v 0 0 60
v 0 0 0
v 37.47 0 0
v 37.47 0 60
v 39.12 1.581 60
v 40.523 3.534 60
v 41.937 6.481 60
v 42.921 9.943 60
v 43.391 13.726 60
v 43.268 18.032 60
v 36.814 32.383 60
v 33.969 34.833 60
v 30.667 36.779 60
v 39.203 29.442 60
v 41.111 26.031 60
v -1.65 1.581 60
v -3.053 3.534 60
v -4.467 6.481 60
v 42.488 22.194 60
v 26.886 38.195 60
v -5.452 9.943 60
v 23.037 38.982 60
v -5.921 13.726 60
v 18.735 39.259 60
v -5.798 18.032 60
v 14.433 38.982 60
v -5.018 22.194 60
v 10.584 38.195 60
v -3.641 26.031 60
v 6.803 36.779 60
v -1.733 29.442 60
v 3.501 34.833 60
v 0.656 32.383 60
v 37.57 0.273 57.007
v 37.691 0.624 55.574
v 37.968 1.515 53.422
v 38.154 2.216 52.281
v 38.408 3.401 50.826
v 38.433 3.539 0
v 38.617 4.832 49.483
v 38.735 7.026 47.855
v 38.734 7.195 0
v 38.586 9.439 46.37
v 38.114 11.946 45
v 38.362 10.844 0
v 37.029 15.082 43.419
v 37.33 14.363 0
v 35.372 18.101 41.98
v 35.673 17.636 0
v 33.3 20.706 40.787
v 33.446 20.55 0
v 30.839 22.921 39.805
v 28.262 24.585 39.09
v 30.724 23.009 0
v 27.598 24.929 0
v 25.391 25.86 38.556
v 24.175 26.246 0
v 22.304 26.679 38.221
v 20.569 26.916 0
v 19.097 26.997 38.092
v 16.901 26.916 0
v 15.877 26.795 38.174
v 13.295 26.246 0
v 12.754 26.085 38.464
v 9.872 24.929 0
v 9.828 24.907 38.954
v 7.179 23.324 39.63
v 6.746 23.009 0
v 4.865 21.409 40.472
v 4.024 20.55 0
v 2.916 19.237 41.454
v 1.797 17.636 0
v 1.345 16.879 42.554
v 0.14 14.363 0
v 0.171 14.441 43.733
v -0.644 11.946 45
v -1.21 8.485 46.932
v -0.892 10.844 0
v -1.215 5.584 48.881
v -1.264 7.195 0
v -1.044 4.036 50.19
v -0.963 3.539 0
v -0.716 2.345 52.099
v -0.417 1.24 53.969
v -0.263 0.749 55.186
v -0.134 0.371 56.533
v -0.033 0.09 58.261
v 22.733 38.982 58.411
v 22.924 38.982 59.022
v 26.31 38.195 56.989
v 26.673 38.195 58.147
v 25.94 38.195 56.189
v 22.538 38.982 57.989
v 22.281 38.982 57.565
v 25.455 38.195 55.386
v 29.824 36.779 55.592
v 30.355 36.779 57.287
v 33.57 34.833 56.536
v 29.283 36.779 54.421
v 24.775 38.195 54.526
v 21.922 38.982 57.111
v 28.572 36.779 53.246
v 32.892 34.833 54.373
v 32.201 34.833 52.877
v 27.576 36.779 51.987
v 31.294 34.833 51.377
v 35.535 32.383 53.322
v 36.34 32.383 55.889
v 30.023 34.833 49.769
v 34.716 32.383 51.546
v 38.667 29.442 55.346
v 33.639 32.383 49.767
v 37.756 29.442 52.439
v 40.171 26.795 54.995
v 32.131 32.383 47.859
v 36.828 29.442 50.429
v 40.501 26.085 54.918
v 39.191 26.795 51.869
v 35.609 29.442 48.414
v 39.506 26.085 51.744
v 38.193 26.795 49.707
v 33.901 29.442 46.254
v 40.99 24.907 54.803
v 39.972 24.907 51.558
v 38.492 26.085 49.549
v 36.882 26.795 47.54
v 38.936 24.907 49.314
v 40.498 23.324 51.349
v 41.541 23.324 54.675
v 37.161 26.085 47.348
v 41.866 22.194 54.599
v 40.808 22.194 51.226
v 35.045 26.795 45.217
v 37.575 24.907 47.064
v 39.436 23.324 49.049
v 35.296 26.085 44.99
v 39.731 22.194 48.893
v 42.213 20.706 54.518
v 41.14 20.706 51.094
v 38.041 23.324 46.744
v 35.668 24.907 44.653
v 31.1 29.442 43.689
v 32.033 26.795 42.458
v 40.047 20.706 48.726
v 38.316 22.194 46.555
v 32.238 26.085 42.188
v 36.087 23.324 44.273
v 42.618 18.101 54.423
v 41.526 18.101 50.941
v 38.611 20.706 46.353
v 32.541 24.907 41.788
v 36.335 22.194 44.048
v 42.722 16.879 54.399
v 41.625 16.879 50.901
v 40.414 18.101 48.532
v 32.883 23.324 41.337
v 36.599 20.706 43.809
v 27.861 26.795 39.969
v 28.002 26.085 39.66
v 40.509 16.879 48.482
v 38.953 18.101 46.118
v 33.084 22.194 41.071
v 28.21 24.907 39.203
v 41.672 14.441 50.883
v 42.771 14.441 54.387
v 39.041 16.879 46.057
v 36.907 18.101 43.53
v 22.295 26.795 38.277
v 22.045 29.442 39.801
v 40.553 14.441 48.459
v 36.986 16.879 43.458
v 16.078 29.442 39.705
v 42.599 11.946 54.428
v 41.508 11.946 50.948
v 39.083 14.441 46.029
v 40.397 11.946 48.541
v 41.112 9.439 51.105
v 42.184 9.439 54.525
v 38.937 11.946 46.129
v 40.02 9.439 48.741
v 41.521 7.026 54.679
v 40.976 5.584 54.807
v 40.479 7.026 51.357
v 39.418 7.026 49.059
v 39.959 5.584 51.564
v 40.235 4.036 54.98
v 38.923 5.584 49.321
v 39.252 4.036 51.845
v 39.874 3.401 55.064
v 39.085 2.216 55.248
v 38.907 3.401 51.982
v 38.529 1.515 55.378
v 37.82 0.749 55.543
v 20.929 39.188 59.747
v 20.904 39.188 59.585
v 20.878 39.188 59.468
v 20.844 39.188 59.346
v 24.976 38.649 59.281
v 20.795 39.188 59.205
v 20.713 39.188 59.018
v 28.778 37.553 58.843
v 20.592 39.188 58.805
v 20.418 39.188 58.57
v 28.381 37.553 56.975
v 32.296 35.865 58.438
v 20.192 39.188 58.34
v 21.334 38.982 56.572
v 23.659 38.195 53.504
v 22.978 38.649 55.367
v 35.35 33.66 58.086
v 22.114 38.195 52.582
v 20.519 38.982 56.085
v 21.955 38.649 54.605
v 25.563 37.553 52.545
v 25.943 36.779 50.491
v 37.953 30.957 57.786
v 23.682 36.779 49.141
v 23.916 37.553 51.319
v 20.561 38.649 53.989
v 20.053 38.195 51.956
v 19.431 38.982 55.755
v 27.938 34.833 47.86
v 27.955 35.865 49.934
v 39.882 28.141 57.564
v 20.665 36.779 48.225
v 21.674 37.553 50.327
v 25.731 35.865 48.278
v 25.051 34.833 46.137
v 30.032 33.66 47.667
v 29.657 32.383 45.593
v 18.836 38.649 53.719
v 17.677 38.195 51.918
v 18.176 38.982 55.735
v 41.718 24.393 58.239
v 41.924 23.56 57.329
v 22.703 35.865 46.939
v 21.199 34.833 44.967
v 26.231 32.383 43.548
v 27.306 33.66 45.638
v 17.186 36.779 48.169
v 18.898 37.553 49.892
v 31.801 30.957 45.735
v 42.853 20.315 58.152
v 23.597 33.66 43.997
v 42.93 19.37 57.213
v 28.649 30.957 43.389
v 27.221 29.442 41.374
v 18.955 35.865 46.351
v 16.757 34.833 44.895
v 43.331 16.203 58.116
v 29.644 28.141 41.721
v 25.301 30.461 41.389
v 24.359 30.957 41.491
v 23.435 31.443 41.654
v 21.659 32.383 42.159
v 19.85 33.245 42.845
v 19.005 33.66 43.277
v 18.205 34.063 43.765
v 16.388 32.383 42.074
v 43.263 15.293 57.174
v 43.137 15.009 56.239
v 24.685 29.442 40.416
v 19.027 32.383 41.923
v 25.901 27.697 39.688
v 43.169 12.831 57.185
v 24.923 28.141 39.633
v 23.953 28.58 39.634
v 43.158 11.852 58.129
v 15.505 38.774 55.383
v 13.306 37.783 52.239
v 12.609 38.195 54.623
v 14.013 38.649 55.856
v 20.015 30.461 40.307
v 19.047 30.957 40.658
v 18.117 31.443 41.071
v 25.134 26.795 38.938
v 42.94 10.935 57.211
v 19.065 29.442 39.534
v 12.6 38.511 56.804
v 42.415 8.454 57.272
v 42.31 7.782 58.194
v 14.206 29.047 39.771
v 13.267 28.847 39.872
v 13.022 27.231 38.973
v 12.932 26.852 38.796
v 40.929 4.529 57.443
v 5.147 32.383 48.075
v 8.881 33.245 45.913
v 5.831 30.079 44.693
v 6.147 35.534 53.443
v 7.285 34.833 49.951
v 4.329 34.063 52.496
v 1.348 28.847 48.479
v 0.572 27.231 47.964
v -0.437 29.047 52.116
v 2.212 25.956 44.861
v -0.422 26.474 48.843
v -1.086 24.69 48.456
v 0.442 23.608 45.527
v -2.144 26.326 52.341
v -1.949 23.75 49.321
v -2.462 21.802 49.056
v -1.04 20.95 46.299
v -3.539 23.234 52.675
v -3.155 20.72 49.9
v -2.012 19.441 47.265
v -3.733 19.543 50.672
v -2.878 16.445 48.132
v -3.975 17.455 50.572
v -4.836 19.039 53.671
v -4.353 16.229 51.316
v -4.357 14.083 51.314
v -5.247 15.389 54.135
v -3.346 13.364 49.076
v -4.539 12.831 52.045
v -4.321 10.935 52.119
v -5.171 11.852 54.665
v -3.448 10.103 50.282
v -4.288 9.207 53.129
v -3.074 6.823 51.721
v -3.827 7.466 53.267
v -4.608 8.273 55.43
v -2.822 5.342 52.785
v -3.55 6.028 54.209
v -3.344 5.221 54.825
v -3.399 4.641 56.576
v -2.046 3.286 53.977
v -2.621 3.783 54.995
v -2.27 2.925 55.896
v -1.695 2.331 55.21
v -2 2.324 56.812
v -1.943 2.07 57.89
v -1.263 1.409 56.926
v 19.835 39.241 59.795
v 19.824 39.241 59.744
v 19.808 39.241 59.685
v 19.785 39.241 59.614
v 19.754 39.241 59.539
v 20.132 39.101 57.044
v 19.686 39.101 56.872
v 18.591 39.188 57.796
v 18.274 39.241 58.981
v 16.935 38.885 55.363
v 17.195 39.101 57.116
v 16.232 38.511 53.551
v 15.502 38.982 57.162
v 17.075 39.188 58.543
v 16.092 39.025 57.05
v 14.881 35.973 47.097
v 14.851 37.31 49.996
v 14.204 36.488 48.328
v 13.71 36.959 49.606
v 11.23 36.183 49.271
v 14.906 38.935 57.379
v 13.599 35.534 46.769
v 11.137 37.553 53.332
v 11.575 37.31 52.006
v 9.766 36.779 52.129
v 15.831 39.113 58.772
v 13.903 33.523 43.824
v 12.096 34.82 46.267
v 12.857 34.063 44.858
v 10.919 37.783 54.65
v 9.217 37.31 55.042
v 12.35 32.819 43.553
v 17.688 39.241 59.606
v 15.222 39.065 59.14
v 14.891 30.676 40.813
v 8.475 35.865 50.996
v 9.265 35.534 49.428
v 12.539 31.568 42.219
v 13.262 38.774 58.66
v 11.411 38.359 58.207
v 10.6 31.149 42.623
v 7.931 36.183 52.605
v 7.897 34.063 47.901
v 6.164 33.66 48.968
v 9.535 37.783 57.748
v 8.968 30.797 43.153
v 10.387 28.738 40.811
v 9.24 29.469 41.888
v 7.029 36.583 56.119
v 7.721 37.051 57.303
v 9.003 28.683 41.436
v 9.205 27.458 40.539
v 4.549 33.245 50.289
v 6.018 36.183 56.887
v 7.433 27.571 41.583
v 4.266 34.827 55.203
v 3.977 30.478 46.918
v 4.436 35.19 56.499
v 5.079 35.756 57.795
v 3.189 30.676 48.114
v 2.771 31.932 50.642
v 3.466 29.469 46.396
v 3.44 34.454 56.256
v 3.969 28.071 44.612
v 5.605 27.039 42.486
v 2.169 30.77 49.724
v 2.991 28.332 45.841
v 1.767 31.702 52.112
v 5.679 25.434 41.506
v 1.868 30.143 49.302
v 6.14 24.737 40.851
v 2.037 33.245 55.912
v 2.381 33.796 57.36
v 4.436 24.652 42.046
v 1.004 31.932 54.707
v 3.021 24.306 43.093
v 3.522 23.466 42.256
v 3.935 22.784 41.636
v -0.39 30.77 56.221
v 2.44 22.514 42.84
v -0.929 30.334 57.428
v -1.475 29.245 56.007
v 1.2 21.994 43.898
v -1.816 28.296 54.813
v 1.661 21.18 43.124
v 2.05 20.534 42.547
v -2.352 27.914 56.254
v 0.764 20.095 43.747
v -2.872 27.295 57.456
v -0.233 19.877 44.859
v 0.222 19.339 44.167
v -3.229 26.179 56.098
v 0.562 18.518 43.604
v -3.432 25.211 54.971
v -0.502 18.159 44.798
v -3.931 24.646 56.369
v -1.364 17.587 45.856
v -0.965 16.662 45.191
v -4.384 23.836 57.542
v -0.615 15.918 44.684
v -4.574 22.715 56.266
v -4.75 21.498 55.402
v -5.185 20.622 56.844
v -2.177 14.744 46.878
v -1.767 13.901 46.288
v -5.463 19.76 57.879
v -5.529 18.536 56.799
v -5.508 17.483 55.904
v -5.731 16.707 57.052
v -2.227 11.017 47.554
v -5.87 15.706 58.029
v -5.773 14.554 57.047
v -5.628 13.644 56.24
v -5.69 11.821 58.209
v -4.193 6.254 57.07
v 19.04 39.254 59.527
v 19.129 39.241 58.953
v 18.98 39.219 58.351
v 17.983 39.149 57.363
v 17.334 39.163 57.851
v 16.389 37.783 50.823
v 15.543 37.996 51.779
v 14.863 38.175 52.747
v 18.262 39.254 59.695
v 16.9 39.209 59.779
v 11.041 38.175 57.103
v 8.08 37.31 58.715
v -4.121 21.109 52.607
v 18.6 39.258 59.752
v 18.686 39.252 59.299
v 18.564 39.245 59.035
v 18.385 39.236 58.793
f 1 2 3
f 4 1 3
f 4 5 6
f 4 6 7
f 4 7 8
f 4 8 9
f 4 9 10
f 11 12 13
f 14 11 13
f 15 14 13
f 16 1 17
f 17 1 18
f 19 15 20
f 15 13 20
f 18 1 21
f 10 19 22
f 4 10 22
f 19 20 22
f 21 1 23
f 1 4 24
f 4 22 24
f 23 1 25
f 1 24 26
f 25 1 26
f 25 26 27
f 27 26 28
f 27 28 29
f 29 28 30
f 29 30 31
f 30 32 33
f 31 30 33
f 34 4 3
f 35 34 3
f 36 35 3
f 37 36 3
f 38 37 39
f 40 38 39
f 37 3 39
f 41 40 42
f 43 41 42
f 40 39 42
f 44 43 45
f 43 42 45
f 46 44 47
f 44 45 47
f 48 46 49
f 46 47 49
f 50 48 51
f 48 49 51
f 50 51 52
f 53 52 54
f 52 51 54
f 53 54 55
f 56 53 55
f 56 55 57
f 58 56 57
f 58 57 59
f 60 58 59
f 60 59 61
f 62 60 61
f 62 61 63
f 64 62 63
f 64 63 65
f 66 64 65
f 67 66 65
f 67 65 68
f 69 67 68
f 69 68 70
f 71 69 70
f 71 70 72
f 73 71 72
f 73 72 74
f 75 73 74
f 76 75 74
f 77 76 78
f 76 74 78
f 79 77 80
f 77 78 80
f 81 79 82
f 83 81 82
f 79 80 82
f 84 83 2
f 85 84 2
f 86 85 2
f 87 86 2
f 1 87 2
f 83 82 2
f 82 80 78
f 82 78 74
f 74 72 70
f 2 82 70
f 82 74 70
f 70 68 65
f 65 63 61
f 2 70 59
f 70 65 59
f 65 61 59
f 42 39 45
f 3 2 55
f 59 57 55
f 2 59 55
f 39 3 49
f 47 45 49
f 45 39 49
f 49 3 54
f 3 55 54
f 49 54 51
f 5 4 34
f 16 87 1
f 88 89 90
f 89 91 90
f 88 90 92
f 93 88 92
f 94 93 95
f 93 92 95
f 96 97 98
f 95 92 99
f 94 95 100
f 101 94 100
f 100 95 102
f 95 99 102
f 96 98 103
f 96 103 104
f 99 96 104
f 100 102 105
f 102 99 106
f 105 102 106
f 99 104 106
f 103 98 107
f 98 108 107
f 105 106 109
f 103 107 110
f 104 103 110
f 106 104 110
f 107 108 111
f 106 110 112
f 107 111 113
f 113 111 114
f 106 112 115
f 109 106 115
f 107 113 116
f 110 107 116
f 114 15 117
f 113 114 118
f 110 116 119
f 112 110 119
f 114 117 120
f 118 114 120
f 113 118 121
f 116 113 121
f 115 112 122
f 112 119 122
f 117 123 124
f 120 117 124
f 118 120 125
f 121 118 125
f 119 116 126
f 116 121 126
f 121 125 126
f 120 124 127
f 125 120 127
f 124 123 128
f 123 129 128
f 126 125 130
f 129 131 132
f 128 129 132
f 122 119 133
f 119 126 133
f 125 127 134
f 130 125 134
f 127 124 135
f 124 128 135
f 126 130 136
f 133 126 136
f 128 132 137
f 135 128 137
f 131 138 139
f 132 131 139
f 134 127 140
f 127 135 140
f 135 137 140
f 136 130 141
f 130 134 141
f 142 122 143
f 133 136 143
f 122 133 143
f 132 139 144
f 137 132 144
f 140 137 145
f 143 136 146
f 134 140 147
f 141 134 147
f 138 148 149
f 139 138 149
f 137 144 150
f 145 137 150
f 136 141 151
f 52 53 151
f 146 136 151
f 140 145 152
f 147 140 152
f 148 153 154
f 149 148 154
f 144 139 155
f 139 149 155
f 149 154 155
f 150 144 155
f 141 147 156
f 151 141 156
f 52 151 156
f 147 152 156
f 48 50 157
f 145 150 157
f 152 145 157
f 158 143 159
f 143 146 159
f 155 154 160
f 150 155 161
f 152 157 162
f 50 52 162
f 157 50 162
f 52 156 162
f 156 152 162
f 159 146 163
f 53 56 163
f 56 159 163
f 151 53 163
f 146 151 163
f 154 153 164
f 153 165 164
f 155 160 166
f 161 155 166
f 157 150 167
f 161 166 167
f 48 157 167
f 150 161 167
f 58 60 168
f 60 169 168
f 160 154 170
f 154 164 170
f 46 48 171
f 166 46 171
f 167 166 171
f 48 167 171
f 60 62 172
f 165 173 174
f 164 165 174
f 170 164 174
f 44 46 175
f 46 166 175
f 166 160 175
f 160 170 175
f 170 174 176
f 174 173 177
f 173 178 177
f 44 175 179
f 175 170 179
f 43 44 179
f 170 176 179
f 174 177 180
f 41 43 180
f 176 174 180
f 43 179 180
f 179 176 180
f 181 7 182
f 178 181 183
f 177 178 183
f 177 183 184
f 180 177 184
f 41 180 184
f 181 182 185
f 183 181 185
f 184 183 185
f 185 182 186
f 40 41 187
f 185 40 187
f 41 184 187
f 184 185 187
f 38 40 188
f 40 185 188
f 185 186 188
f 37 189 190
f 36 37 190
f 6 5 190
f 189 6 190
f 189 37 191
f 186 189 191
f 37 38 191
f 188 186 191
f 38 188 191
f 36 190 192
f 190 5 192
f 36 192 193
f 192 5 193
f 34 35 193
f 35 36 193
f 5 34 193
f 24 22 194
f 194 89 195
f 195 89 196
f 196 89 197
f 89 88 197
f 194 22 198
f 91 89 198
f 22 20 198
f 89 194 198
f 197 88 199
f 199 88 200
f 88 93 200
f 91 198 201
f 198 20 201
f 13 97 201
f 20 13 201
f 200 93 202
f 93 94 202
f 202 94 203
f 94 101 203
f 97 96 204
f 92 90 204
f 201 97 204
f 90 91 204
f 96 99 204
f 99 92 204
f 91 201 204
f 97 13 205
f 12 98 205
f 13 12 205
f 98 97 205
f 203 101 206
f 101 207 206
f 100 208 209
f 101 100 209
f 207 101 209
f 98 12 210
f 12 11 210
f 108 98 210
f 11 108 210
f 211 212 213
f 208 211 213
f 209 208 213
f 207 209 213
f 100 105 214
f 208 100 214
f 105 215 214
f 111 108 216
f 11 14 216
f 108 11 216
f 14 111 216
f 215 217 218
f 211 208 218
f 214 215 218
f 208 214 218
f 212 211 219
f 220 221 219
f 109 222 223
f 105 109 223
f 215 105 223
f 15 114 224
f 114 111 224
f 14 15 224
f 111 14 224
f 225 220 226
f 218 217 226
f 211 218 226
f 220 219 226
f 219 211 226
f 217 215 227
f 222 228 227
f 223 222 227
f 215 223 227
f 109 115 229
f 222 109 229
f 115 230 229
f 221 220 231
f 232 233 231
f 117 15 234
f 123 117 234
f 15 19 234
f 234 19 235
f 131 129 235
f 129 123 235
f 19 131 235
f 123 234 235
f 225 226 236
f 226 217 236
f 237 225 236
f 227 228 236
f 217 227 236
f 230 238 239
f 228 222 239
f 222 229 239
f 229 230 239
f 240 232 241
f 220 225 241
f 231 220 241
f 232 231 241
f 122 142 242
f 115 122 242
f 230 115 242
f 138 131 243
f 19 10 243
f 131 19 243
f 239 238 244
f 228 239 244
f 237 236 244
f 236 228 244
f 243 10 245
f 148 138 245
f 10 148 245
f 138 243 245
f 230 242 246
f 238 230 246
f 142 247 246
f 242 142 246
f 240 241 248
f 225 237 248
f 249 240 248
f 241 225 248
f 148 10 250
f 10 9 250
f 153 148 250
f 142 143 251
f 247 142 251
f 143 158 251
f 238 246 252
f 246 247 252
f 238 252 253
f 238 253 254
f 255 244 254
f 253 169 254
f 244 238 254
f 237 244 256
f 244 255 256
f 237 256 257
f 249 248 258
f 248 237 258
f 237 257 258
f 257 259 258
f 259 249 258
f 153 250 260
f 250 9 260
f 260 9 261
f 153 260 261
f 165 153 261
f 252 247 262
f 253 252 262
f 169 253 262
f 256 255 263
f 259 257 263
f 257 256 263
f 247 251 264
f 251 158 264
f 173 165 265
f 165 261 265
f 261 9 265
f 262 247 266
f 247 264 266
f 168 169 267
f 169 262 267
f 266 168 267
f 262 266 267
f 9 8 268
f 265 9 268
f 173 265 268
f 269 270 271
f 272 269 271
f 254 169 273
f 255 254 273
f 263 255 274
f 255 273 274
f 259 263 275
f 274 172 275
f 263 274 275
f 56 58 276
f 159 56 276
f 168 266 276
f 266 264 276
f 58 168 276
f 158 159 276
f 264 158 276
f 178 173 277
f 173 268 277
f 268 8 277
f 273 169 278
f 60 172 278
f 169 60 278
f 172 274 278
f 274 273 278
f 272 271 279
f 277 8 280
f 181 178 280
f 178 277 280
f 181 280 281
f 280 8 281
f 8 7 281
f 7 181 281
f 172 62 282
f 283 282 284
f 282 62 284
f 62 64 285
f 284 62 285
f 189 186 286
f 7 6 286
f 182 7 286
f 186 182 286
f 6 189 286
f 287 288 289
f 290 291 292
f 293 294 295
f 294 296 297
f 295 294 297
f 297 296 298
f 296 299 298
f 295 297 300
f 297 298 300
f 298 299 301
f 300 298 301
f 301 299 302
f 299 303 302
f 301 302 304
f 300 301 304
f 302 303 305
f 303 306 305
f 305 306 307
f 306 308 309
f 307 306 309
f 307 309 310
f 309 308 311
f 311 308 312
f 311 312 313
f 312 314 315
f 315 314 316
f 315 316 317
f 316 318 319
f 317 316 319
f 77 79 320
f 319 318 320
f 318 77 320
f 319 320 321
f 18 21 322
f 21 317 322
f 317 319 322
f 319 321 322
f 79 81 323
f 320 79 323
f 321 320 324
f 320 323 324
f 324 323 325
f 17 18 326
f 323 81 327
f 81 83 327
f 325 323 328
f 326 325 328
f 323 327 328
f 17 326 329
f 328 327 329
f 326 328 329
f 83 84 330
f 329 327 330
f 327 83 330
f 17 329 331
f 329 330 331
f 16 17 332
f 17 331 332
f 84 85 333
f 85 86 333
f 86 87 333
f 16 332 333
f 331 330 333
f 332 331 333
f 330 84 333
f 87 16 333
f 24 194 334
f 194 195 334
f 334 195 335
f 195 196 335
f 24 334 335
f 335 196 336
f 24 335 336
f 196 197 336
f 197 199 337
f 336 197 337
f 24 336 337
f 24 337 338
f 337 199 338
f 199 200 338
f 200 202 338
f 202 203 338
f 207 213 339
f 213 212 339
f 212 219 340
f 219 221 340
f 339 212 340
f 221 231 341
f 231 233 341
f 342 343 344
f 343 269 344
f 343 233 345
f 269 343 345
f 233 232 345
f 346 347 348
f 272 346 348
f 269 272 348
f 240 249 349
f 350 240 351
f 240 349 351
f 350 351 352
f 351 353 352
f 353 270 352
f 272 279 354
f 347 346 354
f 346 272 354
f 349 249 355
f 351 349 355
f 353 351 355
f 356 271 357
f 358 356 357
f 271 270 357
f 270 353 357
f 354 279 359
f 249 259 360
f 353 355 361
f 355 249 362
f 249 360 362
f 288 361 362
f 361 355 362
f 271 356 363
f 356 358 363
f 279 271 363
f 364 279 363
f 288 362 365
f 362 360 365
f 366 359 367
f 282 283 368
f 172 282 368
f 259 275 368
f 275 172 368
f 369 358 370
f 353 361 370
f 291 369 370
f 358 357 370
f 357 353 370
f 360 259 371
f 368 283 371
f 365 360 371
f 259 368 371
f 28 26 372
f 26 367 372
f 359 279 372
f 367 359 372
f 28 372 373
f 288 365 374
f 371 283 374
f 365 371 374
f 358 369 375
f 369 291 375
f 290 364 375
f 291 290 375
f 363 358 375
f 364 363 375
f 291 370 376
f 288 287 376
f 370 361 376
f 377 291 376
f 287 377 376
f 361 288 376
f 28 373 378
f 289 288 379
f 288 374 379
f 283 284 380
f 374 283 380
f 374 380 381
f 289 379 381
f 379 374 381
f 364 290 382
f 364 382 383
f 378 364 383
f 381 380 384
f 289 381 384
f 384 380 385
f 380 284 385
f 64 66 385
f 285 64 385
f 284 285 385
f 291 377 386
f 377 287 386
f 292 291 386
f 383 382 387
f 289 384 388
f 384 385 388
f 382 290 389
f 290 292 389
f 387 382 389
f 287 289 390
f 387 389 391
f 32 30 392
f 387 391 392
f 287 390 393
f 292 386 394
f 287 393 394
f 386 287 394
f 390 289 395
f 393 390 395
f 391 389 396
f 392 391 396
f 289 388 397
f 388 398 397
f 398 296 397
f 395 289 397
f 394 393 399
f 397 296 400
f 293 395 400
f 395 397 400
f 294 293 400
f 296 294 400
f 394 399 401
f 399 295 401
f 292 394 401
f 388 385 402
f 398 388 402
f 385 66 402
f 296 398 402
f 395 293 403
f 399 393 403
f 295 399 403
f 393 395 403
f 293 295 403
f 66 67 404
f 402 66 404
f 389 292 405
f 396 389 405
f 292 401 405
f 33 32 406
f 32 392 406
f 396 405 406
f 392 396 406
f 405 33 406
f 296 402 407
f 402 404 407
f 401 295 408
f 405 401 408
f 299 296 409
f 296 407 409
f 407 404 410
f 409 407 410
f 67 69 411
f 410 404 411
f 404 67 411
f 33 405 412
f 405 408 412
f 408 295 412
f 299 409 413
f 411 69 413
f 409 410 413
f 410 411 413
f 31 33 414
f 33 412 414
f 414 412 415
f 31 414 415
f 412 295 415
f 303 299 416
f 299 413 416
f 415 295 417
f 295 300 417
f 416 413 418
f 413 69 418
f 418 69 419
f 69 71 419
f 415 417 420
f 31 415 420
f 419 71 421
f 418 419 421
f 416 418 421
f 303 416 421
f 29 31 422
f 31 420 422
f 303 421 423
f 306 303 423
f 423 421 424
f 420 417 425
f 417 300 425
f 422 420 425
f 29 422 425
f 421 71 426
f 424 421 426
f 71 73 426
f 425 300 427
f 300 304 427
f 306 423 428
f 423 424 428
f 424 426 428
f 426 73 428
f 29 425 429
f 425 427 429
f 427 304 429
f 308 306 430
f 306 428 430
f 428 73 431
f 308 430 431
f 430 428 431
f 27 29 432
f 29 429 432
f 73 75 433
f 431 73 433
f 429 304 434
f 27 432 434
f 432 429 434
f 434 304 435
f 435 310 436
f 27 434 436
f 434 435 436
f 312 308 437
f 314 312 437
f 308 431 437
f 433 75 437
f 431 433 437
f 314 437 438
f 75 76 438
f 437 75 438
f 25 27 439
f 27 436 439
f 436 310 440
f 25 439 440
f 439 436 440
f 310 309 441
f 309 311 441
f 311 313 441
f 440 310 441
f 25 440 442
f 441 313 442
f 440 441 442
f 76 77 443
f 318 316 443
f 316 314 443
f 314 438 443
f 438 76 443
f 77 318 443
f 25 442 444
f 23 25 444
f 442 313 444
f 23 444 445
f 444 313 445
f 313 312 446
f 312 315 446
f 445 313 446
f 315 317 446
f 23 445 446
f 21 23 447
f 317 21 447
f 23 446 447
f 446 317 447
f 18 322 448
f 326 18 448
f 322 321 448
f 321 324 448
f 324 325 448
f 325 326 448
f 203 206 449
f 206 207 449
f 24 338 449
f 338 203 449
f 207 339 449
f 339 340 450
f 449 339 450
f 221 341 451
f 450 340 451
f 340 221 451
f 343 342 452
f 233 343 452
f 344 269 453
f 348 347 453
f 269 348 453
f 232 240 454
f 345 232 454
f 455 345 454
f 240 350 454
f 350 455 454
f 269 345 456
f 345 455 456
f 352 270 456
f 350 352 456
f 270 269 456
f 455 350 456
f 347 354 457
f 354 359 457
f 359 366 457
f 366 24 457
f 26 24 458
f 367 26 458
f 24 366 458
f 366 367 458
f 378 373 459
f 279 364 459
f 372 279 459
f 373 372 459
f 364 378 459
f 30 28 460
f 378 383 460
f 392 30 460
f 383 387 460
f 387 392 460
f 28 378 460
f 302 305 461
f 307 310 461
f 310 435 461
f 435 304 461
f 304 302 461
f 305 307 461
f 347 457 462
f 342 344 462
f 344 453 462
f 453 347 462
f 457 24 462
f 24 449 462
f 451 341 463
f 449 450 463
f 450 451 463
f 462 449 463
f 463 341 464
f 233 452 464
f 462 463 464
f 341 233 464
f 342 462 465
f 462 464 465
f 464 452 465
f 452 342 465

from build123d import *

# Parameters (mm, degrees)
BOSS_EXTRUDE1_DEPTH = 45
REVOLVE1_ANGLE      = 180
BOSS_EXTRUDE2_DEPTH = 15


with BuildPart() as part:
    # Sketch1 → Boss-Extrude1 (new body)
    with BuildSketch(Plane.XY):
        with BuildLine():
            Line((0, 0), (37.46998799, 0))
            ThreePointArc((37.46998799, 0), (18.734993995, 27), (0, 0))
        make_face()
    extrude(amount=BOSS_EXTRUDE1_DEPTH)



with BuildPart() as body_2:
    # Sketch4 → Revolve1 (revolve)
    with BuildSketch(Plane.XY.offset(60)):
        with BuildLine():
            Line((18.734993995, 0), (18.734993995, 39.259436234))
            add(Edge.make_bspline(
                [(18.734993995, 39.259436234), (46.178787864, 39.232586668), (48.009362148, 8.206101436), (37.46998799, 0)],
                knots=[0, 0, 0, 0, 1, 1, 1, 1], degree=3))
            Line((37.46998799, 0), (18.734993995, 0))
        make_face()
    revolve(axis=Axis((18.734993995, 0, 60), (0, 1, 0)), revolution_arc=REVOLVE1_ANGLE)


with BuildPart() as part_1:
    add(part.part)

    add(body_2.part)  # Boss-Extrude2 merges body 2
    # Sketch5 → Boss-Extrude2 (add)
    with BuildSketch(Plane.XY.offset(45)):
        with BuildLine():
            Line((0, 0), (37.46998799, 0))
            ThreePointArc((37.46998799, 0), (18.734993995, 27), (0, 0))
        make_face()
    extrude(amount=BOSS_EXTRUDE2_DEPTH)


solid = part_1.part
